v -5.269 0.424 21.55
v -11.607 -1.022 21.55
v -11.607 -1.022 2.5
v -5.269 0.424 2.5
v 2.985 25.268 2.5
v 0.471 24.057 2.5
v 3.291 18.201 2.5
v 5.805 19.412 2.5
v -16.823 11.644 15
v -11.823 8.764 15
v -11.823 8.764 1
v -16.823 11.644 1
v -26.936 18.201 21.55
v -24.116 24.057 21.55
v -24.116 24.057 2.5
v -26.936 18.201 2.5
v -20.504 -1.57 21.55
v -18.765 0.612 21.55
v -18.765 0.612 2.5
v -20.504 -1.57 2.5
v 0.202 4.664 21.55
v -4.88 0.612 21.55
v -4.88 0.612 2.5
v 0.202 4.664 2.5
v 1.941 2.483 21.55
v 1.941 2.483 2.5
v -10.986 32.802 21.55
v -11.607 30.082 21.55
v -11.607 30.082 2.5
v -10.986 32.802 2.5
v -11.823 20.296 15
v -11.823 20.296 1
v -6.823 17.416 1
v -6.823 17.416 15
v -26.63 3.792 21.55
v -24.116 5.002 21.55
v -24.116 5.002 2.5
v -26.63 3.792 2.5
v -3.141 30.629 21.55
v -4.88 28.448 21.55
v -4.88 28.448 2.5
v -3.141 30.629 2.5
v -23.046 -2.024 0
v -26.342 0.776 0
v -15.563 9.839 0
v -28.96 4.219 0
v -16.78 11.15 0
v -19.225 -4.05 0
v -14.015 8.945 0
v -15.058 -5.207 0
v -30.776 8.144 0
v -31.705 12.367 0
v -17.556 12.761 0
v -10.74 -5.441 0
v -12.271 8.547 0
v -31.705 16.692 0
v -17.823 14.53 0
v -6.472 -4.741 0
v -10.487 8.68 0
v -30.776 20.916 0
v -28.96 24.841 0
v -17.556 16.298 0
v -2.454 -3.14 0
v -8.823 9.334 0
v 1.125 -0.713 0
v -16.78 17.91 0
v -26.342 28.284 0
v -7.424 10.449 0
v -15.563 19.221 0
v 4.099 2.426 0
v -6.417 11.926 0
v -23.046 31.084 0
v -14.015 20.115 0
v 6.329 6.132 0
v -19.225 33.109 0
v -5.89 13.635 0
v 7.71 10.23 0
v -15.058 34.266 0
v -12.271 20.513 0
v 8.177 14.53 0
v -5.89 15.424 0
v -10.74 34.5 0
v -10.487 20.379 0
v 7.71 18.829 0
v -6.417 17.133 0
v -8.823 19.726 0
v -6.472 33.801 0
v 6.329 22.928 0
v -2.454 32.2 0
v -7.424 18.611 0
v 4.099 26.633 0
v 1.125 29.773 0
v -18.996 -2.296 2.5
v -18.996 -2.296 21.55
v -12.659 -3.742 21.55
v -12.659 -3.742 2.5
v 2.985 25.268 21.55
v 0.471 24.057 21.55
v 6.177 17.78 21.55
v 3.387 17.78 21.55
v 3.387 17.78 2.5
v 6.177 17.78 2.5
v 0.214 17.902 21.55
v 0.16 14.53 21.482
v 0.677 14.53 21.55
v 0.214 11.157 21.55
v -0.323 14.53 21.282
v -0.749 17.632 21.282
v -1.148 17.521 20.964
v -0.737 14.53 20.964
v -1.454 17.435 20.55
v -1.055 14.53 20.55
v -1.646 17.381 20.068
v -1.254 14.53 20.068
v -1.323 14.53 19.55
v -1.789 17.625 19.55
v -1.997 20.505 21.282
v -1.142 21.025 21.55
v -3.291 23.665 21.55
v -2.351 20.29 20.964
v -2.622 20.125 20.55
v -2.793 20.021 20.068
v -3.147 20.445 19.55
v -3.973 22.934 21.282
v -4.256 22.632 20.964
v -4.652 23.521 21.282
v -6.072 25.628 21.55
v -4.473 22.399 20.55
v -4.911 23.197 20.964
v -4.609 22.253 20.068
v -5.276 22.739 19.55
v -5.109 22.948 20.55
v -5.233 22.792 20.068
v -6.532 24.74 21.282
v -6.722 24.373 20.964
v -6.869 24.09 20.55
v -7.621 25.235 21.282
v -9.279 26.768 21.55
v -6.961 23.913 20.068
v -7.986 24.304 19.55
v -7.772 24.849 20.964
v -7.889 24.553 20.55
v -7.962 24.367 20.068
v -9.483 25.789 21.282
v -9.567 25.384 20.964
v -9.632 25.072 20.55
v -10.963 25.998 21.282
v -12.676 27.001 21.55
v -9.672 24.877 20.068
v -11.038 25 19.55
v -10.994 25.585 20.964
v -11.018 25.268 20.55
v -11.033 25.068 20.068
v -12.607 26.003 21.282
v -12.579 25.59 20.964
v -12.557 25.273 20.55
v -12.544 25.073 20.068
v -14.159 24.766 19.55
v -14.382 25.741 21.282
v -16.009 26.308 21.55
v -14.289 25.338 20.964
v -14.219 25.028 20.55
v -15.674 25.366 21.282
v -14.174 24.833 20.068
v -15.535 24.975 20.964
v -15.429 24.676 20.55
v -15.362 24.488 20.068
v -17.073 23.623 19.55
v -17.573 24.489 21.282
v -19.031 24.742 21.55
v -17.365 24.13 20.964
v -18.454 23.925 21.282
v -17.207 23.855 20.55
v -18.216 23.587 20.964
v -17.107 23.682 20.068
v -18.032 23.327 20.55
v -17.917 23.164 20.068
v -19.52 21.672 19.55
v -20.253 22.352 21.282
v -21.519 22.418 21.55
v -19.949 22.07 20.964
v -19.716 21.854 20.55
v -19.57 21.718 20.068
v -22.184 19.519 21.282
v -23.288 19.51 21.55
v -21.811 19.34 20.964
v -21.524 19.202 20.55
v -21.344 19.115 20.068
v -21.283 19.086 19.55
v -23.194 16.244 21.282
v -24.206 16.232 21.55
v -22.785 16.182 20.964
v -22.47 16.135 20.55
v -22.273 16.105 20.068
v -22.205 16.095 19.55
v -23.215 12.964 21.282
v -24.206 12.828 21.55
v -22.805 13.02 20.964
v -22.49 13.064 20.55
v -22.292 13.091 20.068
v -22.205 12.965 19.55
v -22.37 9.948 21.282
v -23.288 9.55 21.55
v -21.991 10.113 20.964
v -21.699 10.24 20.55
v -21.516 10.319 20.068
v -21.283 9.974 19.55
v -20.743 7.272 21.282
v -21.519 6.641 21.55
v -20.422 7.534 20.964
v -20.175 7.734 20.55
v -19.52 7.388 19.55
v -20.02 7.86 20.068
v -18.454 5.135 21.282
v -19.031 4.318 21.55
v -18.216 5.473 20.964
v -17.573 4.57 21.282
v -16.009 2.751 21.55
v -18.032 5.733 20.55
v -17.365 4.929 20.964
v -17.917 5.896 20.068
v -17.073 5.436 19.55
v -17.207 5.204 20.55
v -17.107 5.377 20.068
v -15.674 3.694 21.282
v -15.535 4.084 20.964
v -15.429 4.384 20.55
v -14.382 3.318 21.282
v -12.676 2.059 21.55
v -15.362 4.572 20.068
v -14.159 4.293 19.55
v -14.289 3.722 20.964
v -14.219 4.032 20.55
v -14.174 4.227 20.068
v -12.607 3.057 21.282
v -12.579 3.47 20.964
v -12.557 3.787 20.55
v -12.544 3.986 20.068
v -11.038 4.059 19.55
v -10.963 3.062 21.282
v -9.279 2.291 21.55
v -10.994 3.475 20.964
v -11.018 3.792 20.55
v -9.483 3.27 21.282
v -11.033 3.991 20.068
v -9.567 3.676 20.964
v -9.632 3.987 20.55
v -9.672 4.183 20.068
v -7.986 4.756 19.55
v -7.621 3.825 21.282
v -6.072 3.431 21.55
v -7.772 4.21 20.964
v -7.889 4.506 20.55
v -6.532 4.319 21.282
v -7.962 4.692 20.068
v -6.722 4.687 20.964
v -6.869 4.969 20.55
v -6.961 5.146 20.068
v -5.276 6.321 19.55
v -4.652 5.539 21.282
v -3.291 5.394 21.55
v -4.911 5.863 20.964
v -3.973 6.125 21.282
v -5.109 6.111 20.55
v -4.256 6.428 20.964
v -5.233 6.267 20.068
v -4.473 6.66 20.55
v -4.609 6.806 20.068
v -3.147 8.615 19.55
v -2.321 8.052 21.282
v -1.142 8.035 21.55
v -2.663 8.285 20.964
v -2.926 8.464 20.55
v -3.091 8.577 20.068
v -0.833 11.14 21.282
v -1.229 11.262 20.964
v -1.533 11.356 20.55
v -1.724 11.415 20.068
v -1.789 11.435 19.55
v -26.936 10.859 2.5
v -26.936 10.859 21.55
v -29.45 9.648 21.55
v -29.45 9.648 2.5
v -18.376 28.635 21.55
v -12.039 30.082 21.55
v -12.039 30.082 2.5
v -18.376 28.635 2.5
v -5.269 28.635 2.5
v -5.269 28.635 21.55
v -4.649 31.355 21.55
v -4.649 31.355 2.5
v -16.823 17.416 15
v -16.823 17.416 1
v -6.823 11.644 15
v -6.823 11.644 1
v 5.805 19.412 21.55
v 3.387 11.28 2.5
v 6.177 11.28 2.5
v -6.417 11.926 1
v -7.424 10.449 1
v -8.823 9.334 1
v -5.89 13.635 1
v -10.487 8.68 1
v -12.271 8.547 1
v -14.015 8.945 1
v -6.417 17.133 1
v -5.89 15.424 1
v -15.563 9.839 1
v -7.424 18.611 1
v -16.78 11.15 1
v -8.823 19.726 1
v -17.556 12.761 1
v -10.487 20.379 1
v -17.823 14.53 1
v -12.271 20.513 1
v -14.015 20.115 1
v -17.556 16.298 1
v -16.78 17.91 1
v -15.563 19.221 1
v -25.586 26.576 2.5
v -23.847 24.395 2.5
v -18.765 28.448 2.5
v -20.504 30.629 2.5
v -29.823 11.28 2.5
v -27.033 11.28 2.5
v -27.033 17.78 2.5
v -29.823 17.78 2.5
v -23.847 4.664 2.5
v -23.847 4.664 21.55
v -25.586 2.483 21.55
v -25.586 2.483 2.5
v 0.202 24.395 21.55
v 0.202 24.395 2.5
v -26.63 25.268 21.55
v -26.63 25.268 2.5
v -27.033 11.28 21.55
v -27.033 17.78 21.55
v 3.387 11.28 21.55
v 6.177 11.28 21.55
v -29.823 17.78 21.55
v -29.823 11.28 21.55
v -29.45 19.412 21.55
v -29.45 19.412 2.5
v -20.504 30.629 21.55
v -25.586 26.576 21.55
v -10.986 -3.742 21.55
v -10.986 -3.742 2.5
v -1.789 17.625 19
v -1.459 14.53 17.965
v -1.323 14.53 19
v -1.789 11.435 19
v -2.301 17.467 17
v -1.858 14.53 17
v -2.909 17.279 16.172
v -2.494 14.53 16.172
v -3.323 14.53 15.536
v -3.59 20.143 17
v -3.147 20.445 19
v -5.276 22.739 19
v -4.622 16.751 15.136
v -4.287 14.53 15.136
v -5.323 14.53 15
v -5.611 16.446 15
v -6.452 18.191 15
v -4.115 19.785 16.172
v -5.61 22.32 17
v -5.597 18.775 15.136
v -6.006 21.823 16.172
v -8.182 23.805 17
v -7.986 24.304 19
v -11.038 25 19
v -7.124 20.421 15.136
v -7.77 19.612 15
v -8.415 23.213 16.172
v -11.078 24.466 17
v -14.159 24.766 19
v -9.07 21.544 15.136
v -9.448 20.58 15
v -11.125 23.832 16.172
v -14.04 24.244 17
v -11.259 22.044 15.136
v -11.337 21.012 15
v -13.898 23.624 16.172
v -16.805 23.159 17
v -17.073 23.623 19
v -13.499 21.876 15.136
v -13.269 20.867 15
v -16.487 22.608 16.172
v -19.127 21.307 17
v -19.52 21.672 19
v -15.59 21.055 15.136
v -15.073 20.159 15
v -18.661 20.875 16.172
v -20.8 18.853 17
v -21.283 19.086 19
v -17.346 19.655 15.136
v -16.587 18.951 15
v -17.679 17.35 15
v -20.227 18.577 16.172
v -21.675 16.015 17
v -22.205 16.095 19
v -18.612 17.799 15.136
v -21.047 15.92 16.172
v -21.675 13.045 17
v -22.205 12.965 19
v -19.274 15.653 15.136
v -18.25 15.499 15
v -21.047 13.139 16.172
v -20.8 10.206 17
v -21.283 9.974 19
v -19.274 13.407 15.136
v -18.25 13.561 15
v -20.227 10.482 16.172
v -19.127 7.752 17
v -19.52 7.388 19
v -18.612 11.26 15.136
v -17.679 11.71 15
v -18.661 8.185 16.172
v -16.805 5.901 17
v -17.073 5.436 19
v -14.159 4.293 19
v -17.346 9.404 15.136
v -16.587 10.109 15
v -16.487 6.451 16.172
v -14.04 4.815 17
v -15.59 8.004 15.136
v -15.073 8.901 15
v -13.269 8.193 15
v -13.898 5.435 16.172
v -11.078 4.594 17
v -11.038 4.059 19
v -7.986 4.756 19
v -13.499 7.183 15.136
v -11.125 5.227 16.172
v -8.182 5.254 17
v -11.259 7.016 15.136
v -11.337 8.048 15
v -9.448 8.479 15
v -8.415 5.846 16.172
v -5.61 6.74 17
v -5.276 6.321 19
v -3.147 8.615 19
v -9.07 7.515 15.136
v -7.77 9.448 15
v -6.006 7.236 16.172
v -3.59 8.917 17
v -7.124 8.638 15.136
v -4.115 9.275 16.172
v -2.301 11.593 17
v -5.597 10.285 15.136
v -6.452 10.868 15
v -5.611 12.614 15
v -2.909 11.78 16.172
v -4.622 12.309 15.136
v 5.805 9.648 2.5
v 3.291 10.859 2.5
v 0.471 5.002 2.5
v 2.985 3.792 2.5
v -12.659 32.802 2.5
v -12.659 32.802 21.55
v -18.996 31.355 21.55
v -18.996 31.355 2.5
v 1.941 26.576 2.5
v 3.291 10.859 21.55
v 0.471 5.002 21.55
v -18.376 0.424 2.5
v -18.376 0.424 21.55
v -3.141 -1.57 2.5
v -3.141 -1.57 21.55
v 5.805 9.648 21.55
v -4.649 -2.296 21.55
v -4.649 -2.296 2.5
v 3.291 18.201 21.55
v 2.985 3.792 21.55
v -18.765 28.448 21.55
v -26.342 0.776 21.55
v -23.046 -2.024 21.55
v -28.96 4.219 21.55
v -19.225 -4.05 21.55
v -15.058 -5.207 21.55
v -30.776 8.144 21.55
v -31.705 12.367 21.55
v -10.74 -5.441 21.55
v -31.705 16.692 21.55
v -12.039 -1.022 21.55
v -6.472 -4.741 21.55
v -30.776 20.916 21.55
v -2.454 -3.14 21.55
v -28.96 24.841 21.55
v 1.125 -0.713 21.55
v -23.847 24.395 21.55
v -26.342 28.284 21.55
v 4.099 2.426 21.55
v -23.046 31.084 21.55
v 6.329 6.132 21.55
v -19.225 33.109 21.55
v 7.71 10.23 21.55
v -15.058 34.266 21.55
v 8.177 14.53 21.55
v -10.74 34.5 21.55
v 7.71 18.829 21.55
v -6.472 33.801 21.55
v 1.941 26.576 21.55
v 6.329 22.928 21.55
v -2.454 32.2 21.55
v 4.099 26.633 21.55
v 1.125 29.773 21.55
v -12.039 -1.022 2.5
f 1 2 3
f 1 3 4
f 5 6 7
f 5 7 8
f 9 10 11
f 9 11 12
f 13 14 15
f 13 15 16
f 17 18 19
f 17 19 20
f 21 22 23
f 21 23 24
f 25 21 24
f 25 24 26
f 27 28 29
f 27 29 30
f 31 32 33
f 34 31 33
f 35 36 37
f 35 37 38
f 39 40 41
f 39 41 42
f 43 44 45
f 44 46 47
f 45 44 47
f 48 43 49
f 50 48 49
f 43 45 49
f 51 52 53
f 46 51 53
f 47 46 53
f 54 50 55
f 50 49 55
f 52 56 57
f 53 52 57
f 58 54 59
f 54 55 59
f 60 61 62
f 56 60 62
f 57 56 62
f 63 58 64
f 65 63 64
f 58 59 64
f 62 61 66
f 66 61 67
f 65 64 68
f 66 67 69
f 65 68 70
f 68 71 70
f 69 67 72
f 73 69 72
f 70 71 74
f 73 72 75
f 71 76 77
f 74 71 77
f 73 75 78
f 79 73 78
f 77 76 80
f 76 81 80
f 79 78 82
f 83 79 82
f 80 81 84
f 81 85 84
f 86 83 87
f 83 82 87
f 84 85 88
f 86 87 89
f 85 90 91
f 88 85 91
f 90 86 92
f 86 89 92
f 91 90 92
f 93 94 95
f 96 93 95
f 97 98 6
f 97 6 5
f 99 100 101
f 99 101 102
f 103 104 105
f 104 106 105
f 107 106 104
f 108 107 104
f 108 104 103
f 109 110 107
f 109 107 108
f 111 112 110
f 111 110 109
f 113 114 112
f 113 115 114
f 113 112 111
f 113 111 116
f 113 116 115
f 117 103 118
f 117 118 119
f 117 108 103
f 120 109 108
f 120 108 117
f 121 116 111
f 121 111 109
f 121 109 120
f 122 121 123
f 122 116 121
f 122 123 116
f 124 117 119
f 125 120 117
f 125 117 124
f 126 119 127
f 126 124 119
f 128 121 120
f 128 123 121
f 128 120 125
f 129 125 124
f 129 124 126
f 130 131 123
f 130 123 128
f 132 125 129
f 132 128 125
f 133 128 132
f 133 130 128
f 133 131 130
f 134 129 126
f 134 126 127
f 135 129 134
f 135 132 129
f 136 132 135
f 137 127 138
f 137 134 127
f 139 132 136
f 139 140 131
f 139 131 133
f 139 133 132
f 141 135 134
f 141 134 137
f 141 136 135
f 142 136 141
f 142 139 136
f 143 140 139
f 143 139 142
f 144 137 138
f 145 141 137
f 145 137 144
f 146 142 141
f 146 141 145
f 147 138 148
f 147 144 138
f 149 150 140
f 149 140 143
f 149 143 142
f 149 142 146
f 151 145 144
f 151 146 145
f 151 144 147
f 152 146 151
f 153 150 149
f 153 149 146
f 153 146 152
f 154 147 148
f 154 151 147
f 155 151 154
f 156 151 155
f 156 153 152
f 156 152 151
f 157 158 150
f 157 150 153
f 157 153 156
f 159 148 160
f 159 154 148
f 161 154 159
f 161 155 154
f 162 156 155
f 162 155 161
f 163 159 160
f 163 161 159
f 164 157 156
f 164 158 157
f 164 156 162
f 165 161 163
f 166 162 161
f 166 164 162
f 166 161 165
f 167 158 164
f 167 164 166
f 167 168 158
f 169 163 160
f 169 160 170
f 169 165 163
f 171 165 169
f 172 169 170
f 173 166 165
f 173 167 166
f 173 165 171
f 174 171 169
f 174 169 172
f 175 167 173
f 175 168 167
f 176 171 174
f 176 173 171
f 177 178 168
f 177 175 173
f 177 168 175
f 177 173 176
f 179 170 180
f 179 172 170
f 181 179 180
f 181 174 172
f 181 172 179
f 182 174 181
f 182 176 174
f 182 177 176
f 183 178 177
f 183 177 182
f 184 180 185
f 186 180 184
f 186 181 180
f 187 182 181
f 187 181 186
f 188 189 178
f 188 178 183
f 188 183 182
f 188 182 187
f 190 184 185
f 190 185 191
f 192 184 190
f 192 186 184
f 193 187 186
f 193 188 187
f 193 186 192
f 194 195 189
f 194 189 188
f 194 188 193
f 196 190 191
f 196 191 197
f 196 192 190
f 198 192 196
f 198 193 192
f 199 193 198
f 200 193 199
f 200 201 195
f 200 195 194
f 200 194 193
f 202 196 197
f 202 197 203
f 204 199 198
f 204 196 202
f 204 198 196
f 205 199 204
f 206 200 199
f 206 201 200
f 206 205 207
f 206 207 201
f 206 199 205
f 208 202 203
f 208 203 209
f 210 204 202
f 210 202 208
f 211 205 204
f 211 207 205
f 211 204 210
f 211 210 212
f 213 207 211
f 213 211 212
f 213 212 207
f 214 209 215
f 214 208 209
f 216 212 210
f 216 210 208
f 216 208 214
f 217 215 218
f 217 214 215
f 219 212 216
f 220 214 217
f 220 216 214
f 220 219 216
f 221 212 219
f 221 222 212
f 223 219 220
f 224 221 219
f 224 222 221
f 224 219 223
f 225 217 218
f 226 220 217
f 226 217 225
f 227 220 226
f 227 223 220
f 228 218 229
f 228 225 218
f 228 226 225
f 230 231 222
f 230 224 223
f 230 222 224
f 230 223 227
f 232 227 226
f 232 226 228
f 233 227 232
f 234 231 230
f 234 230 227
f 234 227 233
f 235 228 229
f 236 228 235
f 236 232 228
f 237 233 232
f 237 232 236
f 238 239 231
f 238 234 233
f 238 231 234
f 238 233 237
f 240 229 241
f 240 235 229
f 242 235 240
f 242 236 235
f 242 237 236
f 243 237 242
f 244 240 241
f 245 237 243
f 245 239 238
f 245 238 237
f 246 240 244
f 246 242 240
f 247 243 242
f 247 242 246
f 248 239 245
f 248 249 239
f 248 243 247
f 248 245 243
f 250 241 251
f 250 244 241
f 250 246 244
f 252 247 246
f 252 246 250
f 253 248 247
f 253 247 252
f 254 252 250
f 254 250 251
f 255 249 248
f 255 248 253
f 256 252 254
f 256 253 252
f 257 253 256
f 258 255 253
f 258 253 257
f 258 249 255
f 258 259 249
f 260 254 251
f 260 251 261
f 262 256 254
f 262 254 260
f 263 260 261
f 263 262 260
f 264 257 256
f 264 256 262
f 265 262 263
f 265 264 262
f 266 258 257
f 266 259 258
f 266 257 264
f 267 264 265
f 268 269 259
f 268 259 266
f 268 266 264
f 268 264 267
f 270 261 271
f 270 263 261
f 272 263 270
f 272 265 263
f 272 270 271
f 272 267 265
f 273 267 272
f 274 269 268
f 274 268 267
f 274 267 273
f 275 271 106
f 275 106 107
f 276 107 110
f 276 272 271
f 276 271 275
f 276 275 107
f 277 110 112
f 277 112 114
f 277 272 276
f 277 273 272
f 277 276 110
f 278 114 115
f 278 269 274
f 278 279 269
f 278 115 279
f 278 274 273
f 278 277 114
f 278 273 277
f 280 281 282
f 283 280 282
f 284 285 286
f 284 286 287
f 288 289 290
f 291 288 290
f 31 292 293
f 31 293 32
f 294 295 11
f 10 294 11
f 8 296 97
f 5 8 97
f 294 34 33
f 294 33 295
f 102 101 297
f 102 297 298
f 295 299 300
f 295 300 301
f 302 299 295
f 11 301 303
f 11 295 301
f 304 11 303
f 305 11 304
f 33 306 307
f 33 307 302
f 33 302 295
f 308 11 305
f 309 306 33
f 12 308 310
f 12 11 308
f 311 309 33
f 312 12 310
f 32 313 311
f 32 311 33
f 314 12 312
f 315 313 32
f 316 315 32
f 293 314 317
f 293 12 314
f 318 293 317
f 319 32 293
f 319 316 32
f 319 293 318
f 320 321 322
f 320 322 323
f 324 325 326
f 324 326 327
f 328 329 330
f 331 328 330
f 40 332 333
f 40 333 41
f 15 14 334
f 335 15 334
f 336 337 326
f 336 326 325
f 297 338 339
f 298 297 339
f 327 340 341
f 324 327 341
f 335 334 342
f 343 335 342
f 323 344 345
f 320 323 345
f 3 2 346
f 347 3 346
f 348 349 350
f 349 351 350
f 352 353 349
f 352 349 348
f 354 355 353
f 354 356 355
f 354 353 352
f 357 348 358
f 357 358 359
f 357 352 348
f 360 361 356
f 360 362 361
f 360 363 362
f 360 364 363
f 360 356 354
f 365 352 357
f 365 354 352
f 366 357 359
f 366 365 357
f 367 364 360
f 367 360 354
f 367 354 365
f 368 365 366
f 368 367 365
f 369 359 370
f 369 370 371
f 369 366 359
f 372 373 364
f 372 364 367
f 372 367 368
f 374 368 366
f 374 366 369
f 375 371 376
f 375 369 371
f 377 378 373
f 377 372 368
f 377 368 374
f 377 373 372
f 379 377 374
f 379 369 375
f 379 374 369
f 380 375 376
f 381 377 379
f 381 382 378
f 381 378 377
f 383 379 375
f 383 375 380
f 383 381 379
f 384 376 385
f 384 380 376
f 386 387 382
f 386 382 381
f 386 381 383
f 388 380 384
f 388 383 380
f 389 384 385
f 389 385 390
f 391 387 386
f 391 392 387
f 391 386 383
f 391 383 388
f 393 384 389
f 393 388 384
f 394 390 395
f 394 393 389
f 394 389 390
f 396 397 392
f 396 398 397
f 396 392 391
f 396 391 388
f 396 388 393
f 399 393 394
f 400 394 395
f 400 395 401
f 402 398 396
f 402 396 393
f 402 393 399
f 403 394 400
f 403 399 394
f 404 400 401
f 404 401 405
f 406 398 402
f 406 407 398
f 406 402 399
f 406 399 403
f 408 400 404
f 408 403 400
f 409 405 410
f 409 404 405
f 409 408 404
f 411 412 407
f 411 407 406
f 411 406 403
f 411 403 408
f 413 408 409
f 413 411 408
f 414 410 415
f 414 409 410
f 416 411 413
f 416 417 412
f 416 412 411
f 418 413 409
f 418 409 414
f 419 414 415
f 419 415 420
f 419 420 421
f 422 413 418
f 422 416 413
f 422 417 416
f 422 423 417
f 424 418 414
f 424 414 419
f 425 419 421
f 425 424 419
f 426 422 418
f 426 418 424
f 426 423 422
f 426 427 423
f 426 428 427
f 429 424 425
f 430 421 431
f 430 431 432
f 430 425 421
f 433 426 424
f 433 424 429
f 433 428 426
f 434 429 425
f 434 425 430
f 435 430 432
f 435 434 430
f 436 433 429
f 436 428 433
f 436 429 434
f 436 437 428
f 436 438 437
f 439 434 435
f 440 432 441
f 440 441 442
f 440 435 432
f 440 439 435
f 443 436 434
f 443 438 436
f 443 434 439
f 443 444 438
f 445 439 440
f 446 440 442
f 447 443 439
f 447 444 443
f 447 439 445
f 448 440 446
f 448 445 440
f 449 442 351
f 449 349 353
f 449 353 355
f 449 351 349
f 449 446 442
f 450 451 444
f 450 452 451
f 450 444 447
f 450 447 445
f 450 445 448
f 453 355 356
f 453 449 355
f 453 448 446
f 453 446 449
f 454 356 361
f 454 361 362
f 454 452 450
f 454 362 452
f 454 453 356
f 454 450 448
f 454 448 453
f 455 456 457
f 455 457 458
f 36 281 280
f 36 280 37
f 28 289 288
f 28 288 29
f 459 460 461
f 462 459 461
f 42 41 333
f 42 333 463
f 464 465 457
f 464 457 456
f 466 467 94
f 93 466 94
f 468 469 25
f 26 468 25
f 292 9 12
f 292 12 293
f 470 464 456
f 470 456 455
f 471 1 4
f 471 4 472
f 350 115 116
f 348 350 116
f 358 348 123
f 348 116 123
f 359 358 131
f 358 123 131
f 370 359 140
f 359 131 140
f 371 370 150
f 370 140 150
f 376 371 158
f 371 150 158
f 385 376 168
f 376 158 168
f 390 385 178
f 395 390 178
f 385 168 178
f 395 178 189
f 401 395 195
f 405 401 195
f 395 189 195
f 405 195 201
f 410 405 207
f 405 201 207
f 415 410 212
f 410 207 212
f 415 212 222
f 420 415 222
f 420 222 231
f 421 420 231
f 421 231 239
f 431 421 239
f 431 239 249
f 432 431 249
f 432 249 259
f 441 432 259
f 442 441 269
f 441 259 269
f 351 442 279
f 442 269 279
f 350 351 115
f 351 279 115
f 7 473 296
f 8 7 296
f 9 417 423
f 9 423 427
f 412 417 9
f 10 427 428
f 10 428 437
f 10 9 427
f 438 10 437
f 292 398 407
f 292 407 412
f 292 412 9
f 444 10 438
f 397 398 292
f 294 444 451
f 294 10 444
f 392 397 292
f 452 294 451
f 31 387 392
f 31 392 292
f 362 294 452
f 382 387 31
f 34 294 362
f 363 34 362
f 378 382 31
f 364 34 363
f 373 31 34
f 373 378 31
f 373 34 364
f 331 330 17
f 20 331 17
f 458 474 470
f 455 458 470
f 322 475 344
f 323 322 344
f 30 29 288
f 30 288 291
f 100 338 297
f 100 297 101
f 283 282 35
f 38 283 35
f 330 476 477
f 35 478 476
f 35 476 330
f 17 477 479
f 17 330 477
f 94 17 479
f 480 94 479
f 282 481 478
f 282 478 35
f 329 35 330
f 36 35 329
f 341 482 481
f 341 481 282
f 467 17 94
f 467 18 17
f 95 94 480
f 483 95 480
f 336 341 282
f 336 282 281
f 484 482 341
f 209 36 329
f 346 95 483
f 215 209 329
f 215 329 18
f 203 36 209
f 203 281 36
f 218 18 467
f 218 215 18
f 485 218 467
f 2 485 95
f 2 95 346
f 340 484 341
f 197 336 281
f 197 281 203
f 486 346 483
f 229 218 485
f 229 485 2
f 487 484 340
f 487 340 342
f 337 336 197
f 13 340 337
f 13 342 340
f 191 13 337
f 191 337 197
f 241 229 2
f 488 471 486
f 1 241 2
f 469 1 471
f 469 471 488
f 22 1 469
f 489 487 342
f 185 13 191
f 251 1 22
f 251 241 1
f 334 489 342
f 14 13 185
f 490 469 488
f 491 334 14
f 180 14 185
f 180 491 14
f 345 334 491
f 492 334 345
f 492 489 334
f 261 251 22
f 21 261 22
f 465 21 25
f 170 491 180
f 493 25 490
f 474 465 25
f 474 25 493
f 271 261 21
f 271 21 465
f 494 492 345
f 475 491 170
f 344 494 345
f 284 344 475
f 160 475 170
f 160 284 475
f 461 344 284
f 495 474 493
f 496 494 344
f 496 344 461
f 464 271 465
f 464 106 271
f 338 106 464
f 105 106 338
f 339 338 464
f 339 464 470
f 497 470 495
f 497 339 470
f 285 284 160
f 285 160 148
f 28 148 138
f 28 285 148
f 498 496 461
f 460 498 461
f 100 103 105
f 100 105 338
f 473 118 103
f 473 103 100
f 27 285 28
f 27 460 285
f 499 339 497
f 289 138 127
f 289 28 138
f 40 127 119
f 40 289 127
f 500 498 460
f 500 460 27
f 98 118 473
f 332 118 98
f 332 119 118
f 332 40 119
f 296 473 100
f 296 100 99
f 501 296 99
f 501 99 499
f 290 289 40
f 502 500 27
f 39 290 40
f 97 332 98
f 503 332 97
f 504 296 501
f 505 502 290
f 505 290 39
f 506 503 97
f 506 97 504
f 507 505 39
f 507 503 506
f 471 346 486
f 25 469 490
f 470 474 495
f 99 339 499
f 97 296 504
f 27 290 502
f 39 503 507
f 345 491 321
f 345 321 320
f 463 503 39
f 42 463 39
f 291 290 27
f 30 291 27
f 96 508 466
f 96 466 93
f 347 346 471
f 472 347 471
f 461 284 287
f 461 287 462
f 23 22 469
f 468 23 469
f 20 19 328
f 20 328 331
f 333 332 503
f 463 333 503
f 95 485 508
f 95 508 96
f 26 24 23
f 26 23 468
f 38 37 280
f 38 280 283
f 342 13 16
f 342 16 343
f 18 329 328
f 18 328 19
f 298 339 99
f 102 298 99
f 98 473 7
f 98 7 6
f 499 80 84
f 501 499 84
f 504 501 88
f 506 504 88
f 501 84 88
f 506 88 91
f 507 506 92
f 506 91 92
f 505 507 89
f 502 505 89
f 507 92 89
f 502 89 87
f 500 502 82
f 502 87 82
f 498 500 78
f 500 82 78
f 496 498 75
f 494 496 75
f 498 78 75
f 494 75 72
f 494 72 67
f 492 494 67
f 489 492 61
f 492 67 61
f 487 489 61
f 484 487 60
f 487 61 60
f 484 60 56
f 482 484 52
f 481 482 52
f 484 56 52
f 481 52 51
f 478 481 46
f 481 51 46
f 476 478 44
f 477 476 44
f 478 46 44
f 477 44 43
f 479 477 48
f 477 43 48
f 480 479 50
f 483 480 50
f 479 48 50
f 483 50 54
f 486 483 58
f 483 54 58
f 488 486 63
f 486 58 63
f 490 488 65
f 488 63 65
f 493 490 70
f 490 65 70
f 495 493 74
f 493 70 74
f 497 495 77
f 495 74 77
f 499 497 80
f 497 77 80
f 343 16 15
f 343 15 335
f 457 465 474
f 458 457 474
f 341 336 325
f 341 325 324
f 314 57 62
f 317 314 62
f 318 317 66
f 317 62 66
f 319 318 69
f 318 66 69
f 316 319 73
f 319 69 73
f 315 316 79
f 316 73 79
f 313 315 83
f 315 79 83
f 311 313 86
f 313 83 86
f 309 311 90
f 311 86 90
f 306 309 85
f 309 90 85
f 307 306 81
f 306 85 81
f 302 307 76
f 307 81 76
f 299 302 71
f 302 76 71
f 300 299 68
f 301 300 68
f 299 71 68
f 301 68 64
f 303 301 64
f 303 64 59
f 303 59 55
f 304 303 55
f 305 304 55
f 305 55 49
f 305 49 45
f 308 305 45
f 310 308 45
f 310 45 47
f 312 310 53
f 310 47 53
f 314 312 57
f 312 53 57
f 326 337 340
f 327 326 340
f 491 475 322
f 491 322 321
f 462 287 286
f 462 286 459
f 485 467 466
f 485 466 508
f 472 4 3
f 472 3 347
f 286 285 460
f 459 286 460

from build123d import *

# Parameters (mm, degrees)
SKETCH1_R                       = 20
SKETCH1_R_2                     = 1
BOSS_EXTRUDE1_DEPTH             = 21.55
TAP_DRILL_FOR_M5X0_8_TAP1_D     = 4.2
TAP_DRILL_FOR_M5X0_8_TAP1_DEPTH = 5
TAP_DRILL_FOR_M5X0_8_TAP1_TIP   = 1.2618073
SKETCH4_W                       = 2.79
SKETCH4_H                       = 6.5
CUT_EXTRUDE1_DEPTH              = 19.05
CIRPATTERN1_COUNT               = 14
SKETCH5_R                       = 6
SKETCH5_R_2                     = 5
SKETCH5_R_3                     = 1
CUT_EXTRUDE2_DEPTH              = 1
CUT_EXTRUDE3_DEPTH              = 21.55
SKETCH7_R                       = 10.5
CUT_EXTRUDE4_DEPTH              = 6.55
FILLET4_R                       = 2
FILLET5_R                       = 4


with BuildPart() as part:
    # Sketch1 → Boss-Extrude1 (new body)
    with BuildSketch(Plane.XY):
        with Locations((-11.822558412, 14.529752947)):
            Circle(SKETCH1_R)
        with Locations((-11.822558412, 14.529752947)):
            Circle(SKETCH1_R_2, mode=Mode.SUBTRACT)
    extrude(amount=BOSS_EXTRUDE1_DEPTH)

    # Tap Drill for M5x0.8 Tap1
    with Locations(Plane.XY.offset(21.55)):
        with Locations((-11.822558412, 14.529752947)):
            Hole(TAP_DRILL_FOR_M5X0_8_TAP1_D / 2, depth=TAP_DRILL_FOR_M5X0_8_TAP1_DEPTH)
            with Locations((0, 0, -(TAP_DRILL_FOR_M5X0_8_TAP1_DEPTH + TAP_DRILL_FOR_M5X0_8_TAP1_TIP / 2))):  # 118° drill point
                Cone(0, TAP_DRILL_FOR_M5X0_8_TAP1_D / 2, TAP_DRILL_FOR_M5X0_8_TAP1_TIP, mode=Mode.SUBTRACT)

    # Sketch4 → Cut-Extrude1 (cut)
    with BuildSketch(Plane.XY.offset(21.55)):
        with Locations((4.782441588, 14.529752947)):
            Rectangle(SKETCH4_W, SKETCH4_H)
    cut_extrude1 = extrude(amount=-CUT_EXTRUDE1_DEPTH, mode=Mode.SUBTRACT)

    # CirPattern1: Cut-Extrude1 ×14 about axis
    cirpattern1_axis = Axis((-11.822558412, 14.529752947, 0), (0, 0, 1))
    for i in range(1, CIRPATTERN1_COUNT):
        add(cut_extrude1.rotate(cirpattern1_axis, i * 360 / CIRPATTERN1_COUNT), mode=Mode.SUBTRACT)

    # Sketch5 → Cut-Extrude2 (cut)
    # profile 1 of 2: a face of its own
    with BuildSketch(Plane(origin=(0, 0, 0), x_dir=(-1, 0, 0), z_dir=(0, 0, -1))):
        with Locations((11.822558412, 14.529752947)):
            Circle(SKETCH5_R)
        with Locations((11.822558412, 14.529752947)):
            Circle(SKETCH5_R_2, mode=Mode.SUBTRACT)
    # profile 2 of 2: a face of its own
    with BuildSketch(Plane(origin=(0, 0, 0), x_dir=(-1, 0, 0), z_dir=(0, 0, -1))):
        with Locations((11.822558412, 14.529752947)):
            Circle(SKETCH5_R_2)
        with Locations((11.822558412, 14.529752947)):
            Circle(SKETCH5_R_3, mode=Mode.SUBTRACT)
    extrude(amount=-CUT_EXTRUDE2_DEPTH, mode=Mode.SUBTRACT)

    # Sketch6 → Cut-Extrude3 (cut)
    with BuildSketch(Plane.XY.offset(21.55)):
        Polygon((-16.822558412, 17.416002947), (-11.822558412, 20.295742519), (-6.822558412, 17.416002947), (-6.822558412, 11.643502947), (-11.822558412, 8.763763375), (-16.822558412, 11.643502947), align=None)
    extrude(amount=-CUT_EXTRUDE3_DEPTH, mode=Mode.SUBTRACT)

    # Sketch7 → Cut-Extrude4 (cut)
    with BuildSketch(Plane.XY.offset(21.55)):
        with Locations((-11.822558412, 14.529752947)):
            Circle(SKETCH7_R)
    extrude(amount=-CUT_EXTRUDE4_DEPTH, mode=Mode.SUBTRACT)

    # Fillet4
    fillet4_edges = [part.edges().sort_by_distance(p)[0] for p in [
        (-22.322558412, 14.529752947, 21.55),
    ]]
    fillet(fillet4_edges, radius=FILLET4_R)

    # Fillet5
    fillet5_edges = [part.edges().sort_by_distance(p)[0] for p in [
        (-22.322558412, 14.529752947, 15),
    ]]
    fillet(fillet5_edges, radius=FILLET5_R)


solid = part.part
